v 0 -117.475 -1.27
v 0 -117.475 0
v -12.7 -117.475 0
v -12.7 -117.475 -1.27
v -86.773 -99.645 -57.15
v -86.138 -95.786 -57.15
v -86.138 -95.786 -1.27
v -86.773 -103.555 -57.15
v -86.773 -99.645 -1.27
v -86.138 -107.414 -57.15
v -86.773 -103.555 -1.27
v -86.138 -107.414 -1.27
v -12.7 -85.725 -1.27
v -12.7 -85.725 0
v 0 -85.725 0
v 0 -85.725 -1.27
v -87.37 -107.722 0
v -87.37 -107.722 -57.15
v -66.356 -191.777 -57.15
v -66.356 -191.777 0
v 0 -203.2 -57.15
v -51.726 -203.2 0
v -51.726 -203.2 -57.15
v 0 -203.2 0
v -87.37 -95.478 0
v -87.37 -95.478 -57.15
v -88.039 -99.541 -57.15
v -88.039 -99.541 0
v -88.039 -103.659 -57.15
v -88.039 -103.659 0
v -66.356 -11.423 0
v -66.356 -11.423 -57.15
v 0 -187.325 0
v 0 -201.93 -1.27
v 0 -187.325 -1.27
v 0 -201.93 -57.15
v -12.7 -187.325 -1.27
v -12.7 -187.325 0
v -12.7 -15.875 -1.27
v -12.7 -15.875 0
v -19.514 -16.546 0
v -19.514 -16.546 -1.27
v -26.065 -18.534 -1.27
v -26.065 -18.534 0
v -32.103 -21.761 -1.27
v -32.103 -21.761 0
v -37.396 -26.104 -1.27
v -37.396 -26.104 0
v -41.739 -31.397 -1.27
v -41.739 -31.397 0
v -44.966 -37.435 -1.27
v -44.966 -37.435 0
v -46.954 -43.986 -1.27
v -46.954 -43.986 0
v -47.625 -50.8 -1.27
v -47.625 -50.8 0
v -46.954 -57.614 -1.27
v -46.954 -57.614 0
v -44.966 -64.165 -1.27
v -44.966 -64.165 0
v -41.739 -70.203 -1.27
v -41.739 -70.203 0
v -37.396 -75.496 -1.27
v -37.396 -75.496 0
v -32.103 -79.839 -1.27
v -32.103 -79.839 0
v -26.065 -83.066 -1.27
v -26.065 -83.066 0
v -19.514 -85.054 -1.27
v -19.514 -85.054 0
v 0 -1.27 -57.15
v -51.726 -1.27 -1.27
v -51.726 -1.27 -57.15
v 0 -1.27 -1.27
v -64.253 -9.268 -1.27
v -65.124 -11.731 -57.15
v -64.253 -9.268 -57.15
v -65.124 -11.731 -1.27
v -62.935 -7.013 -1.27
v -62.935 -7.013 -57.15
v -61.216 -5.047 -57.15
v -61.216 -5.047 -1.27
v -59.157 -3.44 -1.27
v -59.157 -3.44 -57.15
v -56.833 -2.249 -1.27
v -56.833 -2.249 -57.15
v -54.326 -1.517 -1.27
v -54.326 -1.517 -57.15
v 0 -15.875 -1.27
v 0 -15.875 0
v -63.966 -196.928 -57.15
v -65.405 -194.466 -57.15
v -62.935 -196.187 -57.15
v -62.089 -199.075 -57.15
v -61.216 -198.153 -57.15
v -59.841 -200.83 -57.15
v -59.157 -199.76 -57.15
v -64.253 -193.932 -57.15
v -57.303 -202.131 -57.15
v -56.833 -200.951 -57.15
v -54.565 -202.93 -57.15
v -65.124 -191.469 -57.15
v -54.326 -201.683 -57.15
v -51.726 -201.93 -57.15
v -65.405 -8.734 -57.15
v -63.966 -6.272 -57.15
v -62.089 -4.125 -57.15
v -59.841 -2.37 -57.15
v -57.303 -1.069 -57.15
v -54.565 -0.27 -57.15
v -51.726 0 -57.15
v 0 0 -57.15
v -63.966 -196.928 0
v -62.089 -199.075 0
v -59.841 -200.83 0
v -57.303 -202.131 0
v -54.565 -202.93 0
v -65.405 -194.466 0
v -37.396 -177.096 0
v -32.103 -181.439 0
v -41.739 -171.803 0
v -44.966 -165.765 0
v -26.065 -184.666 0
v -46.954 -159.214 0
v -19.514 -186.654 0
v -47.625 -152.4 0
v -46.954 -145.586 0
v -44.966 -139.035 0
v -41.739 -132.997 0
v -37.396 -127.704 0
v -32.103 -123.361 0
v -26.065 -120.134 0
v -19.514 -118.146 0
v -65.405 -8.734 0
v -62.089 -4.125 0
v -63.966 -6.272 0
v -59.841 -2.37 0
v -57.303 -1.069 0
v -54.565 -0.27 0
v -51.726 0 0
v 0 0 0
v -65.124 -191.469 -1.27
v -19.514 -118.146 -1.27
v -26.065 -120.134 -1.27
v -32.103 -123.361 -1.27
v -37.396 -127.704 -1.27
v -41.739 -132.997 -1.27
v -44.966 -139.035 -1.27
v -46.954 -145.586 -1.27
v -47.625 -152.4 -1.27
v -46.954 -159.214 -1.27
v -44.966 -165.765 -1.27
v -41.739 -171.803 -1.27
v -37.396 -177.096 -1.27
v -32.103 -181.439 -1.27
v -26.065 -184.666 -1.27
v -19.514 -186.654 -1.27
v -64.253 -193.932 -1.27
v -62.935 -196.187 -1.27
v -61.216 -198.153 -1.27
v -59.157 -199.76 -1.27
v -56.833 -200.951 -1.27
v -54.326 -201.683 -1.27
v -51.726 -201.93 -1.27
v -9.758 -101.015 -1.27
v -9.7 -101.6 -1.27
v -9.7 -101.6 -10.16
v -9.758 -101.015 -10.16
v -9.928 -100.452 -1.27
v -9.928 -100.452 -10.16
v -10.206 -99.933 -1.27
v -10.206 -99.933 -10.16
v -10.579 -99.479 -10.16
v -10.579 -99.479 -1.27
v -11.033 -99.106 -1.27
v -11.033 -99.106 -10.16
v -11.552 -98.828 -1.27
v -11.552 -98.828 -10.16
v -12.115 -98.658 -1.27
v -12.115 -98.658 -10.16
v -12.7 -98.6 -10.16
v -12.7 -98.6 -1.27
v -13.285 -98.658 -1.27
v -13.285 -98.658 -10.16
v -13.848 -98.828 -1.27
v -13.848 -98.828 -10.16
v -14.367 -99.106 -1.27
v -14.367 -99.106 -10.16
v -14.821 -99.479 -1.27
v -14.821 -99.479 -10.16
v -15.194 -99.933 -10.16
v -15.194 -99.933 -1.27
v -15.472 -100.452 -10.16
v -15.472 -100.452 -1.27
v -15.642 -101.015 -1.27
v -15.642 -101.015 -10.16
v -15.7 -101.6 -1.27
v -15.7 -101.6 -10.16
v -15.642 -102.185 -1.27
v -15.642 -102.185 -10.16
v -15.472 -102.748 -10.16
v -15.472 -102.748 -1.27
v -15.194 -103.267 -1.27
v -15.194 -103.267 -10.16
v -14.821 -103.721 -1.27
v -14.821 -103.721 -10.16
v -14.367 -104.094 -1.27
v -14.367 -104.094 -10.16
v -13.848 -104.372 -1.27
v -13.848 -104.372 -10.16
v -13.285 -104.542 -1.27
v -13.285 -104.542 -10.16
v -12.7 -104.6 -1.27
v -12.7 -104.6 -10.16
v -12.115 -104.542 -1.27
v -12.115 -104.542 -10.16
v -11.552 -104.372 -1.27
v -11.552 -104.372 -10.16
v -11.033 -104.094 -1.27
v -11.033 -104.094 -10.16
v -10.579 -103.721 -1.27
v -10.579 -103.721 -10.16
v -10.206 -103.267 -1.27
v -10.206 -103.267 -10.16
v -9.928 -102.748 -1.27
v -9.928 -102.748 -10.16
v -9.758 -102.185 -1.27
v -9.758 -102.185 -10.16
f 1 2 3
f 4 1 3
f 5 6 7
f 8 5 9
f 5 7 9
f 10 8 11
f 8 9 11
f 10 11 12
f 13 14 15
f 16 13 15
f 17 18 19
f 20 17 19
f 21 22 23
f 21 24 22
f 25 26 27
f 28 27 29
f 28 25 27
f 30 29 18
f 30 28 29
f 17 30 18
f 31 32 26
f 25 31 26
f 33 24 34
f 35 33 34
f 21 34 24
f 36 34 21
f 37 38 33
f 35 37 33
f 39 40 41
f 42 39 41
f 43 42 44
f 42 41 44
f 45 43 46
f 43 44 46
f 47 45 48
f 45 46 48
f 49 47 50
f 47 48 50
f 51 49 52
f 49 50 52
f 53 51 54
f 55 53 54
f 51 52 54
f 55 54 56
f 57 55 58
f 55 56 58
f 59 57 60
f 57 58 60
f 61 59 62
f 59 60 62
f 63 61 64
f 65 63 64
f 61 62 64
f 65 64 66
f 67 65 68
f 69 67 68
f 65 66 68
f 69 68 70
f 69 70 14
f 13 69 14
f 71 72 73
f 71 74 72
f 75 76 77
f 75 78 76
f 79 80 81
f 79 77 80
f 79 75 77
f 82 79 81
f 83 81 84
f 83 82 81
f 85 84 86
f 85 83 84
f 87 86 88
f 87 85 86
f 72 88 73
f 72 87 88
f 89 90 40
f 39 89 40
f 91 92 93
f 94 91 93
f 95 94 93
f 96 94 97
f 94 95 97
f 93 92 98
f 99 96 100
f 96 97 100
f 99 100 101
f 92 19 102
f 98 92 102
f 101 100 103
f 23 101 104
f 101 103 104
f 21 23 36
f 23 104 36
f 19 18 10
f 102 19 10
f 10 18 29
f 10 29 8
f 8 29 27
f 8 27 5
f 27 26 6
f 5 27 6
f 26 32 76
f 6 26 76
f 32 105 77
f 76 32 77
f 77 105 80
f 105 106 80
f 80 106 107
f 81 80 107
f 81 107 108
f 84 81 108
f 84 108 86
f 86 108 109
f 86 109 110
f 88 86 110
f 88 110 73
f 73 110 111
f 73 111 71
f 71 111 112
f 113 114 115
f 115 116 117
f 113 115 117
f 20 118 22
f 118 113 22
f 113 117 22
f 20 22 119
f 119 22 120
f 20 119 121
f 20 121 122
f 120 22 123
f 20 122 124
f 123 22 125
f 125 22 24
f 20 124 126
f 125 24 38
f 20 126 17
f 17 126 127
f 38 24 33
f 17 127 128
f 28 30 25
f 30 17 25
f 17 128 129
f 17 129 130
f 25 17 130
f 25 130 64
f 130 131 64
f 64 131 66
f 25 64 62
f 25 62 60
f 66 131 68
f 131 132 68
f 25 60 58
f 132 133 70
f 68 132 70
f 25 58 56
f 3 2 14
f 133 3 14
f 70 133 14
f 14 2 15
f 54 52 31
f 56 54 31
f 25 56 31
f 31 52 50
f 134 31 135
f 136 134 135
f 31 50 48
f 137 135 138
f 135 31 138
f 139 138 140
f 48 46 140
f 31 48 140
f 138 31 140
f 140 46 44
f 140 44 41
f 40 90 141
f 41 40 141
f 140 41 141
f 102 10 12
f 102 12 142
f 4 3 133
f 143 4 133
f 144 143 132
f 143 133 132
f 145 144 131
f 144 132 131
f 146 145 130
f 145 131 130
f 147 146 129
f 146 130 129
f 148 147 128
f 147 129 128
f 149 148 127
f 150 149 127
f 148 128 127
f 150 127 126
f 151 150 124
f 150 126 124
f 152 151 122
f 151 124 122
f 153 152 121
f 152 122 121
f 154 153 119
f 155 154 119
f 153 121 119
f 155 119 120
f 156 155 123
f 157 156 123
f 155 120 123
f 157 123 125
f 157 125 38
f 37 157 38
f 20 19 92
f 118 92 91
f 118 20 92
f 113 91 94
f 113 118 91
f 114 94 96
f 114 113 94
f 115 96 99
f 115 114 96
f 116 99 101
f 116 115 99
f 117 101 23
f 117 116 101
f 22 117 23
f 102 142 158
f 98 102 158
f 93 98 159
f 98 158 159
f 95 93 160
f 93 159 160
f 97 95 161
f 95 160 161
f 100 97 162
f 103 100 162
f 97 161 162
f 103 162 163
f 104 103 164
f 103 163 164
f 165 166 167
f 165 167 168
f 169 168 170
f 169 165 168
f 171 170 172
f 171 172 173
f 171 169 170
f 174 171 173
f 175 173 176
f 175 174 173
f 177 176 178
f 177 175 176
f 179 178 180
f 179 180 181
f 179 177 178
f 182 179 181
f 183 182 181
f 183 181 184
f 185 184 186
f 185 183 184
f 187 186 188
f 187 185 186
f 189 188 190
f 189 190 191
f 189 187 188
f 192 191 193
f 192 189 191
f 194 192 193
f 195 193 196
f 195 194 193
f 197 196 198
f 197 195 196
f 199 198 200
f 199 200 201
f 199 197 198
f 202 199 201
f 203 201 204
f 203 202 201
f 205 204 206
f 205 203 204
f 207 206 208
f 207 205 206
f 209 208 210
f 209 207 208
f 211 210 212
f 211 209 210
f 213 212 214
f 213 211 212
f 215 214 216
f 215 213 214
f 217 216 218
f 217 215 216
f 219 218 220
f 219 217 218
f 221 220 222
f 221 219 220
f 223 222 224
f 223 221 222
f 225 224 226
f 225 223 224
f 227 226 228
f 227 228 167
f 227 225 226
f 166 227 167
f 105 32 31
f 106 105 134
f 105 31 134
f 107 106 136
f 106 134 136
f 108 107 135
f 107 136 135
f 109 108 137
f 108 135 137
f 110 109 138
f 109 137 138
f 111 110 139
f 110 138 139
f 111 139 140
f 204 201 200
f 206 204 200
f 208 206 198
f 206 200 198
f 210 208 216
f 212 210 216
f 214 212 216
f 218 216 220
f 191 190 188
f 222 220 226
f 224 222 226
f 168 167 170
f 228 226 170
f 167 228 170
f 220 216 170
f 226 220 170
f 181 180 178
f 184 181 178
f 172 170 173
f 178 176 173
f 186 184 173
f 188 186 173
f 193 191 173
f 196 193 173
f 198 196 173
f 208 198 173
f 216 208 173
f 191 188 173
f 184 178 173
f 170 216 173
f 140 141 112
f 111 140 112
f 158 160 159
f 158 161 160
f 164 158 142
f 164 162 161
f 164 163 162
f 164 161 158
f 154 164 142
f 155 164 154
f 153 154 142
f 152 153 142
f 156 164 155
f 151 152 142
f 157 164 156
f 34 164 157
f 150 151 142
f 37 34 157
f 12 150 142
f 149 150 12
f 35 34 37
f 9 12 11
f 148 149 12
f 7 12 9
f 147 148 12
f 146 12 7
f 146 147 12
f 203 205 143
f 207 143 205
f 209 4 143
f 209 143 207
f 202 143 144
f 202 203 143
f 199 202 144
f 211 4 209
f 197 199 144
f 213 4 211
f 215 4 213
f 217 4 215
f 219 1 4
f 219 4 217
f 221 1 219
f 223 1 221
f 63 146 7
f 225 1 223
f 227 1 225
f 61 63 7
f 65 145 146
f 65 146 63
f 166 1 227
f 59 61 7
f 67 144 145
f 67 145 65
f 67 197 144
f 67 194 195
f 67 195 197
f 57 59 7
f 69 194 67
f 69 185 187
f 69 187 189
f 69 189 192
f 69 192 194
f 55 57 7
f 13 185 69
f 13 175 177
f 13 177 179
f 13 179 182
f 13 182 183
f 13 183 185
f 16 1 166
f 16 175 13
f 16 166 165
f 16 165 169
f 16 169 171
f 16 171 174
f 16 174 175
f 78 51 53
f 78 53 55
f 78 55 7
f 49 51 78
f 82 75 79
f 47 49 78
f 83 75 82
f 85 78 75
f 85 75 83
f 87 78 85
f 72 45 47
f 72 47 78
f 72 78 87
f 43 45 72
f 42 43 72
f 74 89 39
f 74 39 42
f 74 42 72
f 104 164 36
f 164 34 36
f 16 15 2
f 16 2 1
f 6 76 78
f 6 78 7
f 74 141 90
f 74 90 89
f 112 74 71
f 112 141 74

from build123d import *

# Parameters (mm, degrees)
SKETCH1_W           = 114.3
SKETCH1_H           = 203.2
BOSS_EXTRUDE1_DEPTH = 88.9
CUT_EXTRUDE1_DEPTH  = 115.3
FILLET1_R           = 25.24
FILLET2_R           = 15.08
CUT_EXTRUDE2_DEPTH  = 115.3
LPATTERN1_COUNT     = 2
LPATTERN1_PITCH     = 101.6
SHELL5_T            = -1.27
SKETCH9_R           = 3
BOSS_EXTRUDE2_DEPTH = 8.89
SKETCH10_W          = 88.123203502
SKETCH10_H          = 57.15
CUT_EXTRUDE3_DEPTH  = 204.2


with BuildPart() as part:
    # Sketch1 → Boss-Extrude1 (new body)
    with BuildSketch(Plane(origin=(0, 0, 0), x_dir=(0, 0, -1), z_dir=(1, 0, 0))):
        with Locations((57.15, -101.6)):
            Rectangle(SKETCH1_W, SKETCH1_H)
    extrude(amount=-BOSS_EXTRUDE1_DEPTH)

    # Sketch4 → Cut-Extrude1 (cut, through all)
    with BuildSketch(Plane(origin=(0, 0, -114.3), x_dir=(-1, 0, 0), z_dir=(0, 0, -1))):
        Polygon((88.9, 0), (63.5, 0), (88.9, -101.6), align=None)
        Polygon((88.9, -203.2), (88.9, -101.6), (63.5, -203.2), align=None)
    extrude(amount=-CUT_EXTRUDE1_DEPTH, mode=Mode.SUBTRACT)

    # Fillet1
    fillet1_edges = [part.edges().sort_by_distance(p)[0] for p in [
        (-88.9, -101.6, -57.15),
    ]]
    fillet(fillet1_edges, radius=FILLET1_R)

    # Fillet2
    fillet2_edges = [part.edges().sort_by_distance(p)[0] for p in [
        (-63.5, 0, -57.15),
        (-63.5, -203.2, -57.15),
    ]]
    fillet(fillet2_edges, radius=FILLET2_R)

    # Sketch5 → Cut-Extrude2 (cut, through all)
    with BuildSketch(Plane.XY):
        with BuildLine():
            Line((-12.7, -187.325), (0, -187.325))
            Line((0, -187.325), (0, -117.475))
            Line((0, -117.475), (-12.7, -117.475))
            ThreePointArc((-12.7, -117.475), (-47.625, -152.4), (-12.7, -187.325))
        make_face()
    cut_extrude2 = extrude(amount=-CUT_EXTRUDE2_DEPTH, mode=Mode.SUBTRACT)

    # LPattern1: Cut-Extrude2 ×2
    with Locations(*[(0, i * LPATTERN1_PITCH, 0) for i in range(1, LPATTERN1_COUNT)]):
        add(cut_extrude2, mode=Mode.SUBTRACT)

    # Shell5
    shell5_openings = [part.faces().sort_by_distance(p)[0] for p in [
        (0, -195.2625, -57.15),
        (0, -101.6, -57.15),
        (-30.1625, -152.4, -57.15),
        (-6.35, -117.475, -57.15),
        (-6.35, -187.325, -57.15),
        (0, -7.9375, -57.15),
        (-30.1625, -50.8, -57.15),
        (-6.35, -15.875, -57.15),
        (-6.35, -85.725, -57.15),
    ]]
    offset(amount=SHELL5_T, openings=shell5_openings, kind=Kind.INTERSECTION)

    # Sketch9 → Boss-Extrude2 (add)
    with BuildSketch(Plane.XY.offset(-113.03)):
        with Locations((-12.7, -101.6)):
            Circle(SKETCH9_R)
    boss_extrude2 = extrude(amount=BOSS_EXTRUDE2_DEPTH)

    # Mirror1: Boss-Extrude2 across plane
    add(boss_extrude2.mirror(Plane.XY.offset(-57.15)))

    # Sketch10 → Cut-Extrude3 (cut, through all)
    with BuildSketch(Plane(origin=(0, 0, 0), x_dir=(1, 0, 0), z_dir=(0, 1, 0))):
        with Locations((-44.061601751, 85.725)):
            Rectangle(SKETCH10_W, SKETCH10_H)
    extrude(amount=-CUT_EXTRUDE3_DEPTH, mode=Mode.SUBTRACT)


solid = part.part
